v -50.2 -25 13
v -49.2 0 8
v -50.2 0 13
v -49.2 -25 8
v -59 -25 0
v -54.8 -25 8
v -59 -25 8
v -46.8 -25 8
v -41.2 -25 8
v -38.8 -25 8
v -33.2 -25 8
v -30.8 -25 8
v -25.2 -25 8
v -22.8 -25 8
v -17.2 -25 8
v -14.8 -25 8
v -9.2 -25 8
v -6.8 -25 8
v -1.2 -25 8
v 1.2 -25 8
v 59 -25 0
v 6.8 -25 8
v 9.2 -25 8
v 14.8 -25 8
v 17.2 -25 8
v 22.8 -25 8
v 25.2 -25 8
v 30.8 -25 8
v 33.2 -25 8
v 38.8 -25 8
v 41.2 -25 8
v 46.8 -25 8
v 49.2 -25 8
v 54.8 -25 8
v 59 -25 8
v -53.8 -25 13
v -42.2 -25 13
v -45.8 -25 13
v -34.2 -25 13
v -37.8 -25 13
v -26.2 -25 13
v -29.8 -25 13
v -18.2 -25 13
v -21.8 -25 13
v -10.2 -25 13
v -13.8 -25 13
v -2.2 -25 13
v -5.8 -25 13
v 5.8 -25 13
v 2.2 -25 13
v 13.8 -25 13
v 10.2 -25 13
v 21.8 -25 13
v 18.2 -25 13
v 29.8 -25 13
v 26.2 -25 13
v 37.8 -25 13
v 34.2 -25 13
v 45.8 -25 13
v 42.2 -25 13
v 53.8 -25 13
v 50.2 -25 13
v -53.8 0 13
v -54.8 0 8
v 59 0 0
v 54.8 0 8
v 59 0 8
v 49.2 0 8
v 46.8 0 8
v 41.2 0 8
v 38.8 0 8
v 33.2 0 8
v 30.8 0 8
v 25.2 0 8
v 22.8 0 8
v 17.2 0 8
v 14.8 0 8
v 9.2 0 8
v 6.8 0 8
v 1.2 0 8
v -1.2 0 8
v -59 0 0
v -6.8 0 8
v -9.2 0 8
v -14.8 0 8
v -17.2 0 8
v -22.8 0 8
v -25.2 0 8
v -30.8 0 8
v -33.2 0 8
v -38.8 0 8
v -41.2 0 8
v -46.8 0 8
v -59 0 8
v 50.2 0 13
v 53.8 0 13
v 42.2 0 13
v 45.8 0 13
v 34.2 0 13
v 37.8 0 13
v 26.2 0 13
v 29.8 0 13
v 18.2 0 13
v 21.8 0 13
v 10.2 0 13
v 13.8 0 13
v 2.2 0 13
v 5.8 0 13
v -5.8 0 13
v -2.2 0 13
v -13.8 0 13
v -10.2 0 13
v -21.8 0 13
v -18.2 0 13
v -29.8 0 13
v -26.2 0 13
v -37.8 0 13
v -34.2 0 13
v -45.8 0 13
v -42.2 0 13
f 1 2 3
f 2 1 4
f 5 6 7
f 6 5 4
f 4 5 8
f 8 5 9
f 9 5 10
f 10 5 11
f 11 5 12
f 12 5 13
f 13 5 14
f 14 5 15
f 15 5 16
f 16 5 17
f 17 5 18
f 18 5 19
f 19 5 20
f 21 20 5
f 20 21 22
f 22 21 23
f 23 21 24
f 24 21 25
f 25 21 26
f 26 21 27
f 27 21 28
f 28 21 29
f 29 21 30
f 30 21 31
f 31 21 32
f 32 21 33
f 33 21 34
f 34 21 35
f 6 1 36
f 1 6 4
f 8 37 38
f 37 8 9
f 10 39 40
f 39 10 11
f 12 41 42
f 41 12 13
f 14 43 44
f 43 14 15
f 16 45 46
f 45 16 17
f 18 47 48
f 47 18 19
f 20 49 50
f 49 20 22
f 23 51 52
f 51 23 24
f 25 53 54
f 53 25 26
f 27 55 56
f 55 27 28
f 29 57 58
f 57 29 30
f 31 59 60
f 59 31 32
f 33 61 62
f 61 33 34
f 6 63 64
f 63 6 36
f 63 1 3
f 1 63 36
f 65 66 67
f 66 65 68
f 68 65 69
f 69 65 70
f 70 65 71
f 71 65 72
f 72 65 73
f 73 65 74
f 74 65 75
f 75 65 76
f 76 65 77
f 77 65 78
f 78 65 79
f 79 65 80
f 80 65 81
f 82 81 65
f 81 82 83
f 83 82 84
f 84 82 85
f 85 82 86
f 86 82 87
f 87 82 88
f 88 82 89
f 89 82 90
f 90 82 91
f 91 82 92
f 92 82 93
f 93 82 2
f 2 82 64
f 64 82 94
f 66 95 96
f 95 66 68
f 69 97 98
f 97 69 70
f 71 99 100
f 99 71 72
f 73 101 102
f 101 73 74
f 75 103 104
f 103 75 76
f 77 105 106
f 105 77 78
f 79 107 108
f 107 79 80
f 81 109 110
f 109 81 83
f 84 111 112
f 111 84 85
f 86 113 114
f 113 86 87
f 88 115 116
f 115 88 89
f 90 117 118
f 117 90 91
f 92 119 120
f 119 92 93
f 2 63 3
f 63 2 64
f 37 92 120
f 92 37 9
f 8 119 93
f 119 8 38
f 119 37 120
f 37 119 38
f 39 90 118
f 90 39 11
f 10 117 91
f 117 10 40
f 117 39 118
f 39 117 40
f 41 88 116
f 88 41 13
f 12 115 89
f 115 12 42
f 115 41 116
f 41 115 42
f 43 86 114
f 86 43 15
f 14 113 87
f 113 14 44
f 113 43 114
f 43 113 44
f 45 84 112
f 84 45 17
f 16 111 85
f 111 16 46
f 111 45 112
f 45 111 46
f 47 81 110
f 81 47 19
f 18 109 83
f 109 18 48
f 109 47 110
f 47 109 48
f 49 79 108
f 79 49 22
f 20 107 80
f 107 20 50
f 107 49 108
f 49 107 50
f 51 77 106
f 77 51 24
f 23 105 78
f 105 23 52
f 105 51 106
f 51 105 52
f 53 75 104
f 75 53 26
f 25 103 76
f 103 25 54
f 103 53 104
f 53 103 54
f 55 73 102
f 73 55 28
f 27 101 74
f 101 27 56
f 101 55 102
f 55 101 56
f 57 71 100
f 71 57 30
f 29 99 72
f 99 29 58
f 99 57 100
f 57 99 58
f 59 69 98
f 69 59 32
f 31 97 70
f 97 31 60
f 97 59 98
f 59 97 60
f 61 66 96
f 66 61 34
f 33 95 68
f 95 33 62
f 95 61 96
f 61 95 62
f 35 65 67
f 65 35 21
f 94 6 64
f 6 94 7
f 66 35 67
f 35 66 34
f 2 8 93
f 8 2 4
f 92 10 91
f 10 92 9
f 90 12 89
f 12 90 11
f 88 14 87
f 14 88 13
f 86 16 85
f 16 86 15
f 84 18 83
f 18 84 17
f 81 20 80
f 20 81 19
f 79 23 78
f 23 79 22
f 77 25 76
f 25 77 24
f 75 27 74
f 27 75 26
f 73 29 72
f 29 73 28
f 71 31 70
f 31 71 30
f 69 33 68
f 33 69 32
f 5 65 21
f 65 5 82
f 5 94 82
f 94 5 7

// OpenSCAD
$fn = 32;

// ----------------------------------------------------------------------
// Toothed rack, 14 teeth
// 8 mm pitch, 5 mm teeth
// ----------------------------------------------------------------------

// --- parameters (mm) ---
bar_w = 25;     // bar width (Y)
bar_h = 8;      // bar height (Z)
teeth = 14;     // number of teeth
pitch = 8;      // tooth pitch
tooth_h = 5;    // tooth height above the bar
root_w = 6;     // tooth width at the root
crest_w = 3.6;  // tooth width at the crest

// --- derived feature positions (mm) ---
span = (teeth - 1) * pitch;  // = 104   distance between the outer teeth
bar_l = span + root_w + 8;   // = 118   bar length: teeth plus 4 mm at each end
tooth_x = -span / 2;         // = -52   X of the first tooth
height = bar_h + tooth_h;    // = 13   overall height
feature_centers = [
  [tooth_x + 0 * pitch, -bar_w / 2],
  [tooth_x + 1 * pitch, -bar_w / 2],
  [tooth_x + 2 * pitch, -bar_w / 2],
  [tooth_x + 3 * pitch, -bar_w / 2],
  [tooth_x + 4 * pitch, -bar_w / 2],
  [tooth_x + 5 * pitch, -bar_w / 2],
  [tooth_x + 6 * pitch, -bar_w / 2],
  [tooth_x + 7 * pitch, -bar_w / 2],
  [tooth_x + 8 * pitch, -bar_w / 2],
  [tooth_x + 9 * pitch, -bar_w / 2],
  [tooth_x + 10 * pitch, -bar_w / 2],
  [tooth_x + 11 * pitch, -bar_w / 2],
  [tooth_x + 12 * pitch, -bar_w / 2],
  [tooth_x + 13 * pitch, -bar_w / 2]
];   // tooth centre line, drives the tooth loop

// bar with a rack of teeth, one extruded trapezoium per centre
module rack_tooth() {
  linear_extrude(height = bar_w)
    polygon(points = [
      [0, 0],
      [root_w, 0],
      [root_w / 2 + crest_w / 2, tooth_h + 1],
      [root_w / 2 - crest_w / 2, tooth_h + 1]
    ]);
}

union() {
  translate([-bar_l / 2, -bar_w, 0]) cube([bar_l, bar_w, bar_h]);
  for (centre = feature_centers)
    translate([centre[0] - root_w / 2, 0, bar_h - 1]) rotate([90, 0, 0]) rack_tooth();
}
